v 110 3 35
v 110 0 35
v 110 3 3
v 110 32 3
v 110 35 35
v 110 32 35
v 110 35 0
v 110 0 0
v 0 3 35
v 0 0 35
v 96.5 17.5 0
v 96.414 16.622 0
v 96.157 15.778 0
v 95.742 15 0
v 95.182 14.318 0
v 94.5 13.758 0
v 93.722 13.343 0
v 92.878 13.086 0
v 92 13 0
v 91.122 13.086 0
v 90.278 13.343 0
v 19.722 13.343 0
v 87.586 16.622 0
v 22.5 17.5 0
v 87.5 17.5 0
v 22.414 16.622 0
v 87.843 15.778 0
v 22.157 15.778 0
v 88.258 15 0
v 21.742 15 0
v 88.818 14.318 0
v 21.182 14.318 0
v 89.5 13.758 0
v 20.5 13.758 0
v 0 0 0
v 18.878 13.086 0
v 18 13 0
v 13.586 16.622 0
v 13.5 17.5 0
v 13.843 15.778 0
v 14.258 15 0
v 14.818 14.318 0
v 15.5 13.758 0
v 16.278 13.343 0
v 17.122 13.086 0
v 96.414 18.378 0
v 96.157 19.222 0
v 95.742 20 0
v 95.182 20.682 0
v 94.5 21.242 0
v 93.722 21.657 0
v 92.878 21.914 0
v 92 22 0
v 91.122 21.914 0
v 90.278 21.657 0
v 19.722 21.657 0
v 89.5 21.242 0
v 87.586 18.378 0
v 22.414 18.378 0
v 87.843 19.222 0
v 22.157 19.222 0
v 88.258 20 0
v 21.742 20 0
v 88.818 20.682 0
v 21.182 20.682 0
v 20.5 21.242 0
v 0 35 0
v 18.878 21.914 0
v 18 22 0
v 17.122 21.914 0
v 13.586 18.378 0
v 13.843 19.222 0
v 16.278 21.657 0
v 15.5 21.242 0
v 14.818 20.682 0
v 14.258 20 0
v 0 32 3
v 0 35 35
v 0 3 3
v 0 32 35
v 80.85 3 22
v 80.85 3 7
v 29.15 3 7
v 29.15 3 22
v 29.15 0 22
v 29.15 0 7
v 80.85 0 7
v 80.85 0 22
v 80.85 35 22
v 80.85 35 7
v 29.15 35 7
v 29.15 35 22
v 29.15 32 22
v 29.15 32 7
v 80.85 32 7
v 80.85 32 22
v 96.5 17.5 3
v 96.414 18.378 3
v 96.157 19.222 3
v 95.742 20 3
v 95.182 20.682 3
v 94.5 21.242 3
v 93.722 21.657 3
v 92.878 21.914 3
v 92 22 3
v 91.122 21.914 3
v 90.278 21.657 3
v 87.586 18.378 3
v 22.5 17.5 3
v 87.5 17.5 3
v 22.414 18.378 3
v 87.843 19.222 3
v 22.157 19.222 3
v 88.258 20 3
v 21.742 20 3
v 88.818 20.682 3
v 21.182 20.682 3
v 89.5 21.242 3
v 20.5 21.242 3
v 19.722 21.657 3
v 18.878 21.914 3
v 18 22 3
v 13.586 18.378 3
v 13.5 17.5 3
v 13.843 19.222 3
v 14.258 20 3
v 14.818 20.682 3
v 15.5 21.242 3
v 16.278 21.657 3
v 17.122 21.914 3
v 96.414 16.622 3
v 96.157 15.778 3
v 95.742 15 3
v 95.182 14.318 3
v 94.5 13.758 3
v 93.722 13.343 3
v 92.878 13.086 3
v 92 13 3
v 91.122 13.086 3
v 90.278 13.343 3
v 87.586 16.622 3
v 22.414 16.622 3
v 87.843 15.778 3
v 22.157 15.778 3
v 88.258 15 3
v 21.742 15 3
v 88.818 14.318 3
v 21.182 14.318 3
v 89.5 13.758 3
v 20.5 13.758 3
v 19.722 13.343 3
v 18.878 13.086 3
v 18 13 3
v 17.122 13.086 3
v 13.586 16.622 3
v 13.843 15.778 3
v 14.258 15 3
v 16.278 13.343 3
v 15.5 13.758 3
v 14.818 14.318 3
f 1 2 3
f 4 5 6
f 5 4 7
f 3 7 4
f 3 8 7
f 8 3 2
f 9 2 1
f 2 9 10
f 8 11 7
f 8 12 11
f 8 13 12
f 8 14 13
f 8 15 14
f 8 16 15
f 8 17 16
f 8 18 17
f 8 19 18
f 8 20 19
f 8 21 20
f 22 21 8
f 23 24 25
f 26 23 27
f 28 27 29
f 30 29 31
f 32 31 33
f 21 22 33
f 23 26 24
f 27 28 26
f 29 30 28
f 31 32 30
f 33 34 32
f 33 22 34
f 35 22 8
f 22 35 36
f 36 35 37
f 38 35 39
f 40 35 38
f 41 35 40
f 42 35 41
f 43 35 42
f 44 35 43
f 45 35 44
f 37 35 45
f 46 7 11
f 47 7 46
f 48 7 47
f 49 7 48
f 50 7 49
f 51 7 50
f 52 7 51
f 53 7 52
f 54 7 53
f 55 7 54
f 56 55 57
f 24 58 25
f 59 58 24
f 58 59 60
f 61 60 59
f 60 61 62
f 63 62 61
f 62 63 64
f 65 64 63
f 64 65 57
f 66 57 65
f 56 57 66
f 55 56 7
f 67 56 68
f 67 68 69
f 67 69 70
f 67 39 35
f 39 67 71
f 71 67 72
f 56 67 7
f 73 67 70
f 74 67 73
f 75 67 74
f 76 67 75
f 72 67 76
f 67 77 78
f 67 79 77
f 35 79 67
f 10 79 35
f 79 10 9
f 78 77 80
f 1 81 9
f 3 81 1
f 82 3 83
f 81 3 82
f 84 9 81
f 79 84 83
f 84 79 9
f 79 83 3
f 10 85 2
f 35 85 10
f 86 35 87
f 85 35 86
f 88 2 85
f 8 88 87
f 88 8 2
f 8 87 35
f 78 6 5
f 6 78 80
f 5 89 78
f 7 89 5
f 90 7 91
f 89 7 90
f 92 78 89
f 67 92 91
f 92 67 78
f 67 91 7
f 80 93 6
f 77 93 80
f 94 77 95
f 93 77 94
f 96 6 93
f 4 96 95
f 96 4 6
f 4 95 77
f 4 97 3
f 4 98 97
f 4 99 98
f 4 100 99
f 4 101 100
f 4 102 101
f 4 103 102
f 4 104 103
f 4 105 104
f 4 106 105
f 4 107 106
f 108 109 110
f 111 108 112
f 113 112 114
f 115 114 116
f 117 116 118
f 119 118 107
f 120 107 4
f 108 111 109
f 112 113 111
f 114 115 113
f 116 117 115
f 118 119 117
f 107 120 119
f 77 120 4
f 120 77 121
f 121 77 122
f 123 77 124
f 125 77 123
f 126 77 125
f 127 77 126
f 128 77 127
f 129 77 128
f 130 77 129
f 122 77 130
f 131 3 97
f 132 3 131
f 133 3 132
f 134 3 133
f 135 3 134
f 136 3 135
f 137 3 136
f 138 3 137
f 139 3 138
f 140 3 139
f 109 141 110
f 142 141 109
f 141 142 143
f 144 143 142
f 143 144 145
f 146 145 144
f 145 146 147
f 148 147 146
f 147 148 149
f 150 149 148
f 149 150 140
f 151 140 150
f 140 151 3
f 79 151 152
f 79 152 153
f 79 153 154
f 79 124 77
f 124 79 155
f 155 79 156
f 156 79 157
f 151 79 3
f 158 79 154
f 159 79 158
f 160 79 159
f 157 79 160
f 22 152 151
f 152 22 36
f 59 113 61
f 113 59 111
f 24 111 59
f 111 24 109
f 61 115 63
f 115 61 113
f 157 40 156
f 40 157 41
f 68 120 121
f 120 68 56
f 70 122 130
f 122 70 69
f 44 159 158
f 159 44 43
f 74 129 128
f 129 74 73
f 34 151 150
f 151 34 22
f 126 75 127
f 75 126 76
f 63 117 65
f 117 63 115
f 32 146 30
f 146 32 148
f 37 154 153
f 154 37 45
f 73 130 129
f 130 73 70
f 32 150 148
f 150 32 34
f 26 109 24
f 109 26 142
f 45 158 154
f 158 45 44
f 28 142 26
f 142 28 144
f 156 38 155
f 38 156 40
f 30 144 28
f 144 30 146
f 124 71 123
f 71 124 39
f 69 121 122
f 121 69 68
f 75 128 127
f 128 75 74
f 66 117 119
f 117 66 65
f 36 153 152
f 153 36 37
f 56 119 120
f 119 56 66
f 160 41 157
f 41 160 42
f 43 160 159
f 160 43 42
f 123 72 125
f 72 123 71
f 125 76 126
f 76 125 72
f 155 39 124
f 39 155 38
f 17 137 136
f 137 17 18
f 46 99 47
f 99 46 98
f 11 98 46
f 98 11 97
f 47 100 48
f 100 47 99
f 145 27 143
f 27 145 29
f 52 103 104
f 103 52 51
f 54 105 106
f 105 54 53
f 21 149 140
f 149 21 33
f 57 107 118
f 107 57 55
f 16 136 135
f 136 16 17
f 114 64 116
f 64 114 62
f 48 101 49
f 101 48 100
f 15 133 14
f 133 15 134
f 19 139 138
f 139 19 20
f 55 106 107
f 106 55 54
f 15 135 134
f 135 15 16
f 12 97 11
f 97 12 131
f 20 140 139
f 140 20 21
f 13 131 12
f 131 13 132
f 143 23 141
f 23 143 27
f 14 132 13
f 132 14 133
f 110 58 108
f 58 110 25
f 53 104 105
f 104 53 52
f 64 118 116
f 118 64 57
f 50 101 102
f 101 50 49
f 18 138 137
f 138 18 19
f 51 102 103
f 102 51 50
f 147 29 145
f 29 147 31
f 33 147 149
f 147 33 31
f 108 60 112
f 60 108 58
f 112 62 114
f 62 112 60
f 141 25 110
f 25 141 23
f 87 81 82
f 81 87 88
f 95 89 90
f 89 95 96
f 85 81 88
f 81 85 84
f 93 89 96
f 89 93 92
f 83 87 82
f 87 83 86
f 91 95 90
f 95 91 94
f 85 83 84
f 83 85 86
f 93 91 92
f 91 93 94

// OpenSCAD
$fn = 32;

// ----------------------------------------------------------------------
// U-bracket: 110 x 35 x 35 mm
// ----------------------------------------------------------------------

// --- parameters (mm) ---
span = 110;               // outer length, X
outer_w = 35;             // outer width, Y
wall_h = 35;              // upright height, Z
plate_t = 3;              // wall thickness
hole_d = 9;               // clearance for M8
window_l = 51.7;          // window length
window_h = 15;            // window height

module hole_z(px, py) {
  translate([px, py, -2.5]) cylinder(h = plate_t + 5, d = hole_d);
}
module hole_y_pz(pz) {
  /* through both uprights along Y */
  translate([0, -2.5, pz]) rotate([-90, 0, 0]) cylinder(h = outer_w + 5, d = hole_d);
}

module base() {
  cube([span, outer_w, plate_t]);
}

module uprights() {
  cube([span, plate_t, wall_h]);
  translate([0, outer_w - plate_t, 0]) cube([span, plate_t, wall_h]);
}

difference() {
  union() {
    base();
    uprights();
  }
  hole_z(18, 17.5);
  hole_z(92, 17.5);
  /* lightening window through both uprights */
  translate([span / 2 - window_l / 2, -1, plate_t + 4])
    cube([window_l, outer_w + 2, window_h]);
}
